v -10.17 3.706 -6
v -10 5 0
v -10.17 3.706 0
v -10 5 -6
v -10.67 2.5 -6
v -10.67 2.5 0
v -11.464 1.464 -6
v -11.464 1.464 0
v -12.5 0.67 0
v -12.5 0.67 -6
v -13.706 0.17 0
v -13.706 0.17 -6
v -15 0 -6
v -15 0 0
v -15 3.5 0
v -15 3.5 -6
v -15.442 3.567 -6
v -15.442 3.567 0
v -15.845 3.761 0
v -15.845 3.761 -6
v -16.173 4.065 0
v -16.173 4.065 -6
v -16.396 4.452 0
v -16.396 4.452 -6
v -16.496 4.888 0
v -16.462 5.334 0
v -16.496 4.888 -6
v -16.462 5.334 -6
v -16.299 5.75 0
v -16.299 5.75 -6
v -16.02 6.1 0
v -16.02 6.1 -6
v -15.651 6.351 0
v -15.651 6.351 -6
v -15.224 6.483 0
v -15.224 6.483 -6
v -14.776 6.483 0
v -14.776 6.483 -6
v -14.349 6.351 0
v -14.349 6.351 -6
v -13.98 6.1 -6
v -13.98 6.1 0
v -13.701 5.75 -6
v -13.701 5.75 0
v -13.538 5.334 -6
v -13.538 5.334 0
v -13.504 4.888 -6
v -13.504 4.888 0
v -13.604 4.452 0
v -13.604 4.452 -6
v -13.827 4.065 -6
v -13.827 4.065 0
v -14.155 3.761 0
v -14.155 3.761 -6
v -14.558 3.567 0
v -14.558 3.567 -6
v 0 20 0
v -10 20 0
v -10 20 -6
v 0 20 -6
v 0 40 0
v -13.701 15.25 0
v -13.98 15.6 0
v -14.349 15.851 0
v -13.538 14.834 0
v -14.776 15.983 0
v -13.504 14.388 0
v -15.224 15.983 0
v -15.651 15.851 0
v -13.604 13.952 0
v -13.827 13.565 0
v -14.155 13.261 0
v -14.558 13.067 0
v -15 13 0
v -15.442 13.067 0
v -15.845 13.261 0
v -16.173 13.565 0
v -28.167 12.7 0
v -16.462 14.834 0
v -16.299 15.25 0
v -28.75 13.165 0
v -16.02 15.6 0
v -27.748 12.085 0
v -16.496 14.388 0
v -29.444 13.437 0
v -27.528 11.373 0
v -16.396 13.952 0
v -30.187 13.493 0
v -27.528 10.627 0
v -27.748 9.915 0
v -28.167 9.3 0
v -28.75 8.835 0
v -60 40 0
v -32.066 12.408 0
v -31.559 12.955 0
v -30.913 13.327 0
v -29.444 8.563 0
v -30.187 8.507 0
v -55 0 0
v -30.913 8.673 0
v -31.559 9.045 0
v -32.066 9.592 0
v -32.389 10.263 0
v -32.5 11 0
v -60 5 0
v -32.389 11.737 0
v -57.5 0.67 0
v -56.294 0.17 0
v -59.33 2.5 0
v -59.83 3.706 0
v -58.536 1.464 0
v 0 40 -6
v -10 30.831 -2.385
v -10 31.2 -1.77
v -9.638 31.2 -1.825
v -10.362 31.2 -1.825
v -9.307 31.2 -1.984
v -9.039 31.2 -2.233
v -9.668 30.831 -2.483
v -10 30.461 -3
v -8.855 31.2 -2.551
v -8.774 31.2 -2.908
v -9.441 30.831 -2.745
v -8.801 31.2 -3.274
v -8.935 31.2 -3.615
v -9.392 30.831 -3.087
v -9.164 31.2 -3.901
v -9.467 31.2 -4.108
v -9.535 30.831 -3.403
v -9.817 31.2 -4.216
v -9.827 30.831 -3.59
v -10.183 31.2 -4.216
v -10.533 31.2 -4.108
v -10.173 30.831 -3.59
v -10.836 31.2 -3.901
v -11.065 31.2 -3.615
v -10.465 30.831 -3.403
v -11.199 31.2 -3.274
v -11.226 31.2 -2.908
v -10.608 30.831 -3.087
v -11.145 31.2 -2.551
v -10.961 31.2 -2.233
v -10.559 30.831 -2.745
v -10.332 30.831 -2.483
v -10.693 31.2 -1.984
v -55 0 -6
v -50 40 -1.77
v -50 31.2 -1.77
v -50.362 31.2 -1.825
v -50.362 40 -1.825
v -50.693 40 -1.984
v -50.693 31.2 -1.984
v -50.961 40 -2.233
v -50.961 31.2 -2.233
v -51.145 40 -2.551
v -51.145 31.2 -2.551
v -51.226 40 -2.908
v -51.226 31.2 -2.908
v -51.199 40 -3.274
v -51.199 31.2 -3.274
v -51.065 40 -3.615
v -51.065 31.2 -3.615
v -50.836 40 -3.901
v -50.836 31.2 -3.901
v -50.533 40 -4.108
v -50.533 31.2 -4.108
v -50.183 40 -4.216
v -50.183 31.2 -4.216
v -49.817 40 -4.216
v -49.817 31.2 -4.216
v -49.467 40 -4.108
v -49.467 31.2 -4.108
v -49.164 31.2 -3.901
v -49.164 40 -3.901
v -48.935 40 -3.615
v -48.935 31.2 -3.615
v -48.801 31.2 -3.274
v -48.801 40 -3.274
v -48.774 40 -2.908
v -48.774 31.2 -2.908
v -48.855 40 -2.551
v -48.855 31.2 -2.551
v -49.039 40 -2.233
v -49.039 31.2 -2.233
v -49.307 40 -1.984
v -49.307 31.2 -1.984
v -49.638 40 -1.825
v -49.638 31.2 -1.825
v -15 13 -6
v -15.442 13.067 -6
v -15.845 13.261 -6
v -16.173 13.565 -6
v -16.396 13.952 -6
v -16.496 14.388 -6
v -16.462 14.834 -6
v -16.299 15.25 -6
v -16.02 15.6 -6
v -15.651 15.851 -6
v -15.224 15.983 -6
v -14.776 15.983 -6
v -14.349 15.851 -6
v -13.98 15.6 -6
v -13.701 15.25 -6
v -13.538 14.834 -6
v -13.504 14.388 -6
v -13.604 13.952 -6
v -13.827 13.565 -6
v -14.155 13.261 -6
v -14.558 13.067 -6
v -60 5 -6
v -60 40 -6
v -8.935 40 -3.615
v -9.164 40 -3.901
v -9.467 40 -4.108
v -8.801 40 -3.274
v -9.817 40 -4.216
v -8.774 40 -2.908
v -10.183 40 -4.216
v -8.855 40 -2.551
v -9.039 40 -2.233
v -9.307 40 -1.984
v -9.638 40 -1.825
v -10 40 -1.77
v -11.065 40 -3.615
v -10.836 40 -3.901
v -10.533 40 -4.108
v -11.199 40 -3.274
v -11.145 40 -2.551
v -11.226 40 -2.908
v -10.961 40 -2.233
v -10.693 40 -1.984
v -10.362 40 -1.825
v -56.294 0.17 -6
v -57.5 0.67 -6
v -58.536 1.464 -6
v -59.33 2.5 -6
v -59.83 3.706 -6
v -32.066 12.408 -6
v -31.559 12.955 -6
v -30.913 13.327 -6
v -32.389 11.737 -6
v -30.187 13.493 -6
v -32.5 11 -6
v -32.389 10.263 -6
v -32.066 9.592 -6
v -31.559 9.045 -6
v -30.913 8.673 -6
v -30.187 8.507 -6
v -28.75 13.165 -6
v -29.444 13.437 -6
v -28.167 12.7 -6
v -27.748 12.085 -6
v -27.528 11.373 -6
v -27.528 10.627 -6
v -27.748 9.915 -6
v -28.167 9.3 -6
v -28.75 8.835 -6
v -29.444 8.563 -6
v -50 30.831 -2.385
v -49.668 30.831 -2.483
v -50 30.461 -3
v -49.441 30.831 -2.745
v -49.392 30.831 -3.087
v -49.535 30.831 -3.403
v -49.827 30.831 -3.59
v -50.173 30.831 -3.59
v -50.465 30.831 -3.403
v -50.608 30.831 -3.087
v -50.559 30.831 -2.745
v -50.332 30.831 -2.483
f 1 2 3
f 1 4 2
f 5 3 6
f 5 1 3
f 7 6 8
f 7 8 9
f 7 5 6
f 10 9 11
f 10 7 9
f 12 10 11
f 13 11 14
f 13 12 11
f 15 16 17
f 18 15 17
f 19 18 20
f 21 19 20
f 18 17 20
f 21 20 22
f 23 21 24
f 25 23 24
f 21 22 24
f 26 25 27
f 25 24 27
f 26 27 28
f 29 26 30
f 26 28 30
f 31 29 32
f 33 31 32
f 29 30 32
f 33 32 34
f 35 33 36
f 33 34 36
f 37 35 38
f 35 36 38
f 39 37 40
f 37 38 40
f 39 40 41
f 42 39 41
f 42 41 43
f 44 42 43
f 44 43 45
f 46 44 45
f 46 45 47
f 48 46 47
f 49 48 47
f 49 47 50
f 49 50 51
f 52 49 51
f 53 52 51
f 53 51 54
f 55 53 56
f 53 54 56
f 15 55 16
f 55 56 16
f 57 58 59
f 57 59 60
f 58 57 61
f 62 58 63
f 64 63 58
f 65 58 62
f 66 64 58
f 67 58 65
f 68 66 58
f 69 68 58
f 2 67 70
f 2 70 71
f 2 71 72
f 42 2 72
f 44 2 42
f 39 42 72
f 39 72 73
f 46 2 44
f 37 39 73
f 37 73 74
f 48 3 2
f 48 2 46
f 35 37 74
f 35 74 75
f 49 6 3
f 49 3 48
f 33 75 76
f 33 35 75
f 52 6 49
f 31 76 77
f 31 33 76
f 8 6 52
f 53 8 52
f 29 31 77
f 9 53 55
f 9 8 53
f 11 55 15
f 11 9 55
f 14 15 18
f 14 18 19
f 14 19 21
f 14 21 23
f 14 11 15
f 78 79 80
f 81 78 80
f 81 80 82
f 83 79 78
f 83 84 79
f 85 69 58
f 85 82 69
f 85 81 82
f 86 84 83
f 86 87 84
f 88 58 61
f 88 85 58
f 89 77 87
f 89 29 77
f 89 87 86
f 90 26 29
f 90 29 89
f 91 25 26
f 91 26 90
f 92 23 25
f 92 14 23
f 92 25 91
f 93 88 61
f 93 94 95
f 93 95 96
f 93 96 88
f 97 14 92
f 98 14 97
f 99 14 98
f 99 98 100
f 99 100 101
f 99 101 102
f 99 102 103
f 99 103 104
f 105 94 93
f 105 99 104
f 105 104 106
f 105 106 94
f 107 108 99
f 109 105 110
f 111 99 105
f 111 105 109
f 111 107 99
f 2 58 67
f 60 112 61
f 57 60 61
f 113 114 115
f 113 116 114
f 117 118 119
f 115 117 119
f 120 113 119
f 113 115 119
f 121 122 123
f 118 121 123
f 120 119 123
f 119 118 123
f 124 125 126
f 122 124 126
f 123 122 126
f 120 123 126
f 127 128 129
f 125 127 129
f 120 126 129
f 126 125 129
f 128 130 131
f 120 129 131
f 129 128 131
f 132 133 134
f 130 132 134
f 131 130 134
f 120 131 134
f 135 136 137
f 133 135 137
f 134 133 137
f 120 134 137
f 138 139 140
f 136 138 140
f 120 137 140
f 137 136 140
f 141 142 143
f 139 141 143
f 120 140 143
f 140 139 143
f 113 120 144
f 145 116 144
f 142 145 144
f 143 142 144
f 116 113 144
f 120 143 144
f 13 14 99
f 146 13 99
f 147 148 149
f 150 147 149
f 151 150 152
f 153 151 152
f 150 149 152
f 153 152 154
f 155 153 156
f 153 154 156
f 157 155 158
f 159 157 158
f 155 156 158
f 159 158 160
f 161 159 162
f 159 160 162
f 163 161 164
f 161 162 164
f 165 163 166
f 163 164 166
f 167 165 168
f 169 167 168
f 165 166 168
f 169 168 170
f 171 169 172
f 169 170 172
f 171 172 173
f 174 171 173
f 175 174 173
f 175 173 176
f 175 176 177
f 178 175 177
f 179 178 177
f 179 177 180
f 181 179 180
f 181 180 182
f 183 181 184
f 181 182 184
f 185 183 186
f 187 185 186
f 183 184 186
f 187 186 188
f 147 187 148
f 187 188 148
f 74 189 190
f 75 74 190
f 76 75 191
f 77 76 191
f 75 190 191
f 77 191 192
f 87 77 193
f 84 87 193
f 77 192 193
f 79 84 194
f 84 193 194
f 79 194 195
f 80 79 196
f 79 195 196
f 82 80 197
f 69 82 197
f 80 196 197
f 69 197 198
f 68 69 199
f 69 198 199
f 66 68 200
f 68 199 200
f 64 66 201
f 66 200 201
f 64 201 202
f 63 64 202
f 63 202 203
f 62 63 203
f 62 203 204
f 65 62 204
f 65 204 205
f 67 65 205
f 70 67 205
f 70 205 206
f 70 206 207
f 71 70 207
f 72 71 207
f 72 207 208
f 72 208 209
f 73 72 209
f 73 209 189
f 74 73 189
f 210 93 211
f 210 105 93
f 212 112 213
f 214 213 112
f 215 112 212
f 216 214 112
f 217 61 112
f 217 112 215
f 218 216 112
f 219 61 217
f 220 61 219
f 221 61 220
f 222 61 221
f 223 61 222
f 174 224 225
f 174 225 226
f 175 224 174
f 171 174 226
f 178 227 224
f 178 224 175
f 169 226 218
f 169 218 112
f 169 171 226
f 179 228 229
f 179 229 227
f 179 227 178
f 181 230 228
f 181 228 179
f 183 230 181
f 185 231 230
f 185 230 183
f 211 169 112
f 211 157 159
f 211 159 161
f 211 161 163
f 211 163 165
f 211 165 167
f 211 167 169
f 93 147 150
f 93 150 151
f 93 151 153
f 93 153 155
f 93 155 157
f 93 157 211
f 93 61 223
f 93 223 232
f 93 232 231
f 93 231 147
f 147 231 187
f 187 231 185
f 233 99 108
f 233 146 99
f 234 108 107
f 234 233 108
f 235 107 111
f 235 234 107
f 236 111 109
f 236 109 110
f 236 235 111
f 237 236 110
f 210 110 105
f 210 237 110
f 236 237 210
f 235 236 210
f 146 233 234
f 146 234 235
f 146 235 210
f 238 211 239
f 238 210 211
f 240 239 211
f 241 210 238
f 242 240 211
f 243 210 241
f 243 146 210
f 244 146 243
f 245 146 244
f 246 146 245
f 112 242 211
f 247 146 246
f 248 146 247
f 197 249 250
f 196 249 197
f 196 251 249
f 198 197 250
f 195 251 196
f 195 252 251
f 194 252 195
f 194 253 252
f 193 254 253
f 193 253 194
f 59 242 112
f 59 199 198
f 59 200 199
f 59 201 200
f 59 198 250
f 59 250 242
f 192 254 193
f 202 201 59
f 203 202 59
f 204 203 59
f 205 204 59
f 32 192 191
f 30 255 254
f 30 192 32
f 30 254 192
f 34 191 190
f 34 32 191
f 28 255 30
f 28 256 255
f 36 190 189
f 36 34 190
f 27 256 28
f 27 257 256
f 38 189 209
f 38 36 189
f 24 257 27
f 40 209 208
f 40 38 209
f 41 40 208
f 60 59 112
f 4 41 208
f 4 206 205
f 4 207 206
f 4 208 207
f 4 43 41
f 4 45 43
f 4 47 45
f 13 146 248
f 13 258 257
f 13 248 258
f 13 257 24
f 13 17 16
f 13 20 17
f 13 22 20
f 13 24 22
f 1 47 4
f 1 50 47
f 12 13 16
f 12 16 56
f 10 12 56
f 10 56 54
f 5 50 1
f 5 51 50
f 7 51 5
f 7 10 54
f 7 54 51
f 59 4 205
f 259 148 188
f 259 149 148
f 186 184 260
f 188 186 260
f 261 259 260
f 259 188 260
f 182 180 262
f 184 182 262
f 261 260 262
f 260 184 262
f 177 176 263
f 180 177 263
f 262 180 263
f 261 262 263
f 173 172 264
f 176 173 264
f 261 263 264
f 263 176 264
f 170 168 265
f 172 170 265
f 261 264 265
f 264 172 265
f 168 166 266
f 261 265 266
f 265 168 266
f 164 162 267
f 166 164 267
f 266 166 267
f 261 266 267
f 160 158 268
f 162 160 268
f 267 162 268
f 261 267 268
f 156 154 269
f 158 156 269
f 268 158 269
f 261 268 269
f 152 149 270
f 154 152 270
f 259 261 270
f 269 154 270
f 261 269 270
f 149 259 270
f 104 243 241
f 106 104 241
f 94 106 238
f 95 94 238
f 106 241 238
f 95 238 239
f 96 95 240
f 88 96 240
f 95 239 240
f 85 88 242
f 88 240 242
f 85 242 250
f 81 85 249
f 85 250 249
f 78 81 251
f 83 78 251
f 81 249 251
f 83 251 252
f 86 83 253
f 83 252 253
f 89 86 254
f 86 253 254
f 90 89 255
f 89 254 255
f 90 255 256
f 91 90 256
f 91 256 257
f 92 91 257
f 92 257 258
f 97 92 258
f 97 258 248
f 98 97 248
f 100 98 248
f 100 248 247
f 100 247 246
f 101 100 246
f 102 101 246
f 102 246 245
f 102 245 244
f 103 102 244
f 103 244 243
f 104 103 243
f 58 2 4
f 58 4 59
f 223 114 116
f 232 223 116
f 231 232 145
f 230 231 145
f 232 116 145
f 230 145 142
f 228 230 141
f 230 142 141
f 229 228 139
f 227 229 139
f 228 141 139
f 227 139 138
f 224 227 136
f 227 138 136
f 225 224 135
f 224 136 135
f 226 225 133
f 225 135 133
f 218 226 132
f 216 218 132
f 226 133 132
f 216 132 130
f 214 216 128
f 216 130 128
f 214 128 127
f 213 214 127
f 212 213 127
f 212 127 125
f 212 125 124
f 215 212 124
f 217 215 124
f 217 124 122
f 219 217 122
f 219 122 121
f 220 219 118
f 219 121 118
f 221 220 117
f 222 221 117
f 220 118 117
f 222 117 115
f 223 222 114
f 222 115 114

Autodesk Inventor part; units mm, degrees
ref_plane "YZ Plane" through (0, 0, 0) normal (1, 0, 0) x (0, 1, 0)
ref_plane "XZ Plane" through (0, 0, 0) normal (0, 1, 0) x (-1, 0, 0)
ref_plane "XY Plane" through (0, 0, 0) normal (0, 0, 1) x (1, 0, 0)
sketch "Sketch1" plane through (0, 0, 0) normal (0, 1, 0) x (-1, 0, 0)
  line L0 (0, 0) -> (60, 0)
  line L1 (60, 0) -> (60, -6)
  line L2 (60, -6) -> (0, -6)
  line L3 (0, -6) -> (0, 0)
  dimension "d7" = 60
  dimension "d8" = 6
extrude "Extrusion1" add sketch "Sketch1" along normal blind 40
sketch "Sketch2" plane through (0, 0, -6) normal (0, 0, -1) x (-1, 0, 0)
  circle A0 centre (30, 11) radius 2.5
  line L0 (0, 40) -> (60, 40) projected
  line L1 (0, 0) -> (0, 40) projected
  line L2 (0, 0) -> (60, 0) projected
  dimension "d2" = 5
  dimension "d3" = 29
  dimension "d4" = 30
extrude "Extrusion2" cut sketch "Sketch2" against normal blind 10
fillet "Fillet1" radius 5 2 edges at (-60, 0, -3) (0, 0, -3)
sketch "Sketch3" plane through (-60, 40, 0) normal (0, 0, 1) x (1, 0, 0)
  circle A0 centre (45, -35) radius 1.5
  circle A1 centre (45, -25.5) radius 1.5
  line L0 (5, -40) -> (55, -40) projected
  line L1 (60, -35) -> (60, 0) projected
  point P0 (60, -40)
  dimension "d16" = 5
  dimension "d17" = 9.5
  dimension "d18" = 15
  dimension "d20" = 3
  dimension "d21" = 3
  dimension "d42" = 15
hole "Hole1" at (-15, 5, 0) at (-15, 14.5, 0) direction (0, 0, -1) diameter 3 end through all
sketch "Sketch4" plane through (0, 40, 0) normal (0, 1, 0) x (1, 0, 0)
  circle A0 centre (-10, 2.5) radius 1.5 projected
  circle A1 centre (-50, 2.5) radius 1.5 projected
  circle A2 centre (-50, 3) radius 1.5
  circle A3 centre (-10, 3) radius 1.5
  line L0 (-60, 0) -> (0, 0) projected
  line L1 (-60, 6) -> (-60, 0) projected
  line L2 (0, 0) -> (0, 6) projected
  dimension "d36" = 3
  dimension "d37" = 3
  dimension "d38" = 10
  dimension "d39" = 10
  dimension "d40" = 3
  dimension "d41" = 3
hole "Hole2" at (-50, 40, -3) at (-10, 40, -3) direction (0, -1, 0) diameter 2.459 depth 8.8 tip angle 118 thread size "M3x0.5" class "6H" standard "ISO Metric profile"
sketch "Sketch5" plane through (-60, 40, 0) normal (0, 0, 1) x (1, 0, 0)
  line L0 (70, -50) -> (50, -50)
  line L1 (50, -50) -> (50, -20)
  line L2 (50, -20) -> (70, -20)
  line L3 (70, -20) -> (70, -50)
  line L4 (5, -40) -> (55, -40) projected
  line L5 (60, -35) -> (60, 0) projected
  point P0 (60, -40)
  dimension "d43" = 10
  dimension "d44" = 10
  dimension "d45" = 20
  dimension "d46" = 10
extrude "Extrusion3" cut sketch "Sketch5" against normal blind 10
fillet "Fillet2" radius 5 1 edges at (-10, 0, -3)
equation "\"d22\" = d20"
properties part number "X-Axis_beltplates"
